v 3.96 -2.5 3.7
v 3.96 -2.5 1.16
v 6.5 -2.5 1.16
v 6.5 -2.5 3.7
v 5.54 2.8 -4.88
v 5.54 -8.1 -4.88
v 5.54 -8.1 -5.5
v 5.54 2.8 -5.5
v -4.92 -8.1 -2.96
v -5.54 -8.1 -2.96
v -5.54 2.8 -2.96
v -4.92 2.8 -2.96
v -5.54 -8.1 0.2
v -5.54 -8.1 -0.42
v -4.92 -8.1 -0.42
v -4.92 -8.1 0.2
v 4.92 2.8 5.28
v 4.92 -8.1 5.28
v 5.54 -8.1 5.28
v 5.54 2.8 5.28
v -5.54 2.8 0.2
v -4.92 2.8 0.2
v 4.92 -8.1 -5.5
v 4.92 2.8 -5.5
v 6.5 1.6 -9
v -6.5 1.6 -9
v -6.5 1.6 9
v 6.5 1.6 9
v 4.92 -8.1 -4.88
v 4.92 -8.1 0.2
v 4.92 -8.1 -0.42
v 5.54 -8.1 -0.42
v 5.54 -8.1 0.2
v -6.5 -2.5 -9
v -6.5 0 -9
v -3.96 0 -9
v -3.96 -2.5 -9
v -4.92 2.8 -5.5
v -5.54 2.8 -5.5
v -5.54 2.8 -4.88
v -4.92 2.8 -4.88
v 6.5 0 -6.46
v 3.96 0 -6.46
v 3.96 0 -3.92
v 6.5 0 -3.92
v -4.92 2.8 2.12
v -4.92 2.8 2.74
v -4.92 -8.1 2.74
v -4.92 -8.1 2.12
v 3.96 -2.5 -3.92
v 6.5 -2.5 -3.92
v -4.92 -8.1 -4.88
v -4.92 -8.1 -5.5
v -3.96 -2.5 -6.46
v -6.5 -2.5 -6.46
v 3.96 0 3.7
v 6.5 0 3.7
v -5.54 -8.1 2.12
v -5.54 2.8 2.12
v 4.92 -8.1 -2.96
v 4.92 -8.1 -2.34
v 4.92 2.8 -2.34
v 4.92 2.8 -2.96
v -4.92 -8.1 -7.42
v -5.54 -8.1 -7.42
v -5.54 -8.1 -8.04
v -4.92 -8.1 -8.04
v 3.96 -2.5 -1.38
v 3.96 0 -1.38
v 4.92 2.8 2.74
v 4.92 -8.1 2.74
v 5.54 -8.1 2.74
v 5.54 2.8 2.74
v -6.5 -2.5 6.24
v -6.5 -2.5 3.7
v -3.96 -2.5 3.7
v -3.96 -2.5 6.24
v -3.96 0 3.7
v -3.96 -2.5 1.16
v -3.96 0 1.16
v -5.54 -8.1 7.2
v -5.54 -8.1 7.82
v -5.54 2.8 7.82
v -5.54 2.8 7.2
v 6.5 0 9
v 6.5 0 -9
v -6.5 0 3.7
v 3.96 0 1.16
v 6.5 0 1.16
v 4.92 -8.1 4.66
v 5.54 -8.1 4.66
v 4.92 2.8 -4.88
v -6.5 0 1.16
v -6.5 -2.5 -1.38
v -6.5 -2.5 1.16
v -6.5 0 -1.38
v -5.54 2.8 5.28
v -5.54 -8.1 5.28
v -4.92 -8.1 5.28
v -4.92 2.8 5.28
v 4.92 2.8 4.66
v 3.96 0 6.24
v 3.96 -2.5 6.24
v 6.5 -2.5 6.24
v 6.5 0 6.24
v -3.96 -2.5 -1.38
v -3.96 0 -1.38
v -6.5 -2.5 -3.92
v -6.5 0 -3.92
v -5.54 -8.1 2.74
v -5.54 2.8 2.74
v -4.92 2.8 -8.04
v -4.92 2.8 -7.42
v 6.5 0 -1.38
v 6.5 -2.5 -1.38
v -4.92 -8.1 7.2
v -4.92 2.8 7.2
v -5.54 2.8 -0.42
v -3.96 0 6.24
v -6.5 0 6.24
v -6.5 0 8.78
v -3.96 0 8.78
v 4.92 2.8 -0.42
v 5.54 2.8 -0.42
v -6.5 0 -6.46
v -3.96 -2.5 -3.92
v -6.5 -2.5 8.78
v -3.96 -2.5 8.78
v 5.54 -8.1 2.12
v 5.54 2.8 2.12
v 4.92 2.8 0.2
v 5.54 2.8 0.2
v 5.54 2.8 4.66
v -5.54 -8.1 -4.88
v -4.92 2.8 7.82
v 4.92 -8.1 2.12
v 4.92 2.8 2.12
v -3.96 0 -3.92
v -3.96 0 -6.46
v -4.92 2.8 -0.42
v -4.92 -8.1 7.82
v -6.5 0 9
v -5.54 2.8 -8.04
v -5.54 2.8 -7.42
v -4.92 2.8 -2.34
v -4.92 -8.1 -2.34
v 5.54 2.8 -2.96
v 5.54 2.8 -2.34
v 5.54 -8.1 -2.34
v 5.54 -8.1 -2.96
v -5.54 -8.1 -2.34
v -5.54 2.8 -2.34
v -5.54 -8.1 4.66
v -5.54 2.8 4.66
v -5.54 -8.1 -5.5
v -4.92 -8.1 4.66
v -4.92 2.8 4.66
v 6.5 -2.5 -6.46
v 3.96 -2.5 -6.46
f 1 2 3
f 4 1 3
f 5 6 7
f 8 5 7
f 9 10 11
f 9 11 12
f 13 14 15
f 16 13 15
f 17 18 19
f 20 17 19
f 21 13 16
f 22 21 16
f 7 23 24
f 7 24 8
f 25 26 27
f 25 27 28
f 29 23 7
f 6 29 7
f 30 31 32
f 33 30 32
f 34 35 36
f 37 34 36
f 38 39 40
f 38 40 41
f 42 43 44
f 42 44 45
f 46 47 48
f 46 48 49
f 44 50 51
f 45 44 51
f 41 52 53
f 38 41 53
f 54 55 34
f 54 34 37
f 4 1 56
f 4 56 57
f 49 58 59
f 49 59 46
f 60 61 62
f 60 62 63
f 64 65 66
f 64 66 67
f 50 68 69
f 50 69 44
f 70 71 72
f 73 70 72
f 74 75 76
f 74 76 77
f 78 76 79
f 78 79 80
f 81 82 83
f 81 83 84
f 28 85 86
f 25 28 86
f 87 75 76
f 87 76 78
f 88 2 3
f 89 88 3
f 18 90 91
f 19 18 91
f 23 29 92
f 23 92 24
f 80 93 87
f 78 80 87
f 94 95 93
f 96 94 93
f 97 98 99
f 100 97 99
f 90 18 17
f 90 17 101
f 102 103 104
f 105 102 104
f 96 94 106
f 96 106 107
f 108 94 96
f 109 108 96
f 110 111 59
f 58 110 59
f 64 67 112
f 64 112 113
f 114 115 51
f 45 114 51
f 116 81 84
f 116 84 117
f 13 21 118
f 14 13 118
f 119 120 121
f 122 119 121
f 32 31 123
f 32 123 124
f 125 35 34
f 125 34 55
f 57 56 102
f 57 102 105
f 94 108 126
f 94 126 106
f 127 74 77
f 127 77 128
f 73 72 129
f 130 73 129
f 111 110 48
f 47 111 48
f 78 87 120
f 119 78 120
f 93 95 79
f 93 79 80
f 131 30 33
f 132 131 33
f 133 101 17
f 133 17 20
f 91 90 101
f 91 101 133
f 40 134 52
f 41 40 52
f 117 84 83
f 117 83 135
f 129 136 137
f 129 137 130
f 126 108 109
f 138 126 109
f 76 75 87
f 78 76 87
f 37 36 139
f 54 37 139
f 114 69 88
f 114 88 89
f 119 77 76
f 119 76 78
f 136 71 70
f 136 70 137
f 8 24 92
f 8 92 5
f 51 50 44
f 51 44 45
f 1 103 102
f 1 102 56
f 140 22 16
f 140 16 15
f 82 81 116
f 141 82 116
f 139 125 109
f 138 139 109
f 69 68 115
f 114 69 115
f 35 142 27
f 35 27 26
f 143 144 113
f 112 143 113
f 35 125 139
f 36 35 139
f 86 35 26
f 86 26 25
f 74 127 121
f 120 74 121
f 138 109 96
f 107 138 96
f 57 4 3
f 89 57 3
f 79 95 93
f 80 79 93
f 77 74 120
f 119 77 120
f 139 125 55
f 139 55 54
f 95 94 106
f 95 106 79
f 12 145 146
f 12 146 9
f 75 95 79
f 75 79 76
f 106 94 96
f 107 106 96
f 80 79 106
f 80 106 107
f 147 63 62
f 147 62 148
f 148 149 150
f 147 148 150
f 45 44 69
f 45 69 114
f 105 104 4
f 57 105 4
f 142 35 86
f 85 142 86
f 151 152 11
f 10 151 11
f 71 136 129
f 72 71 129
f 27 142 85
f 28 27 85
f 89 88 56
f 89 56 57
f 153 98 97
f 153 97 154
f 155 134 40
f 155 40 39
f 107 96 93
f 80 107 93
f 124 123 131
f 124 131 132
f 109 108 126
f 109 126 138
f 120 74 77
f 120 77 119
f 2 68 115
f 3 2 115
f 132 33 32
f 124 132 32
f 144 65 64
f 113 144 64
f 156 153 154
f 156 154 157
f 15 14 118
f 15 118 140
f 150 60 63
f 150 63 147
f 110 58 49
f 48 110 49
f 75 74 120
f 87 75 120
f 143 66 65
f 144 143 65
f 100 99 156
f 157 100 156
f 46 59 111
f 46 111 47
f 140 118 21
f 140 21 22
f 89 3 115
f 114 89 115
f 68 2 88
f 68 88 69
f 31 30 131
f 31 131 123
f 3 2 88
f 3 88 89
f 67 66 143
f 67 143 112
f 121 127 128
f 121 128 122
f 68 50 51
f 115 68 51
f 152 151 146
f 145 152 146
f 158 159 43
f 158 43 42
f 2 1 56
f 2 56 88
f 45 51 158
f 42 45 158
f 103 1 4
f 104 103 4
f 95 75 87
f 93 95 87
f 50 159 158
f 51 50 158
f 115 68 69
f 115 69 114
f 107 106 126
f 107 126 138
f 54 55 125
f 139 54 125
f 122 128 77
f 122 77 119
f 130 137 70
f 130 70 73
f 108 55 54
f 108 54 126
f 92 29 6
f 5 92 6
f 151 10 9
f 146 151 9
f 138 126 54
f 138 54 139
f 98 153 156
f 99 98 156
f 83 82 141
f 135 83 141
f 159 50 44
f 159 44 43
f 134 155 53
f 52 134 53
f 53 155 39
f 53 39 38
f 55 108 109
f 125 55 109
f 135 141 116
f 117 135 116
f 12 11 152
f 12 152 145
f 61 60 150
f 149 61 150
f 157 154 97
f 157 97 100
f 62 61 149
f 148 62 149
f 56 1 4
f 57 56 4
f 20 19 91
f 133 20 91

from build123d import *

# Parameters (mm, degrees)
SKETCH1_W              = 13
SKETCH1_H              = 18
BOSS_EXTRUDE1_DEPTH    = 1.6
SKETCH6_W              = 2.54
SKETCH6_H              = 2.54
BOSS_EXTRUDE2_DEPTH    = 2.5
BOSS_EXTRUDE3_START    = -5.3
SKETCH7_W              = 0.62
SKETCH7_H              = 0.62
BOSS_EXTRUDE3_DEPTH    = 10.9
LPATTERN1_START        = -8.1
LPATTERN1_OUTLINE_W    = 0.62
LPATTERN1_OUTLINE_H    = 0.62
LPATTERN1_DEPTH        = 10.9
LPATTERN1_2_OUTLINE_W  = 0.62
LPATTERN1_2_OUTLINE_H  = 0.62
LPATTERN1_2_DEPTH      = 10.9
LPATTERN1_3_OUTLINE_W  = 0.62
LPATTERN1_3_OUTLINE_H  = 0.62
LPATTERN1_3_DEPTH      = 10.9
LPATTERN1_4_OUTLINE_W  = 0.62
LPATTERN1_4_OUTLINE_H  = 0.62
LPATTERN1_4_DEPTH      = 10.9
LPATTERN1_5_OUTLINE_W  = 0.62
LPATTERN1_5_OUTLINE_H  = 0.62
LPATTERN1_5_DEPTH      = 10.9
LPATTERN1_6_OUTLINE_W  = 0.62
LPATTERN1_6_OUTLINE_H  = 0.62
LPATTERN1_6_DEPTH      = 10.9
LPATTERN1_START_2      = -6.5
LPATTERN1_7_OUTLINE_W  = 2.5
LPATTERN1_7_OUTLINE_H  = 2.54
LPATTERN1_7_DEPTH      = 2.54
LPATTERN1_8_OUTLINE_W  = 2.5
LPATTERN1_8_OUTLINE_H  = 2.54
LPATTERN1_8_DEPTH      = 2.54
LPATTERN1_9_OUTLINE_W  = 2.5
LPATTERN1_9_OUTLINE_H  = 2.54
LPATTERN1_9_DEPTH      = 2.54
LPATTERN1_10_OUTLINE_W = 2.5
LPATTERN1_10_OUTLINE_H = 2.54
LPATTERN1_10_DEPTH     = 2.54
LPATTERN1_11_OUTLINE_W = 2.5
LPATTERN1_11_OUTLINE_H = 2.54
LPATTERN1_11_DEPTH     = 2.54
LPATTERN1_12_OUTLINE_W = 2.5
LPATTERN1_12_OUTLINE_H = 2.54
LPATTERN1_12_DEPTH     = 2.54
LPATTERN2_START        = -2.5
LPATTERN2_OUTLINE_W    = 2.54
LPATTERN2_OUTLINE_H    = 2.54
LPATTERN2_DEPTH        = 2.5
LPATTERN2_START_2      = -8.1
LPATTERN2_2_OUTLINE_W  = 0.62
LPATTERN2_2_OUTLINE_H  = 0.62
LPATTERN2_2_DEPTH      = 10.9
LPATTERN3_COUNT        = 5
LPATTERN3_PITCH        = 2.54


# Read off the part's stored shape, not the designer's step: LPattern1, LPattern2
with BuildPart() as part:
    # Sketch1 → Boss-Extrude1 (new body)
    with BuildSketch(Plane(origin=(0, 0, 0), x_dir=(1, 0, 0), z_dir=(0, 1, 0))):
        Rectangle(SKETCH1_W, SKETCH1_H)
    extrude(amount=BOSS_EXTRUDE1_DEPTH)


with BuildPart() as body_2:
    # Sketch6 → Boss-Extrude2 (new body)
    with BuildSketch(Plane.XZ):
        with Locations((-5.23, -7.73)):
            Rectangle(SKETCH6_W, SKETCH6_H)
    extrude(amount=BOSS_EXTRUDE2_DEPTH)


with BuildPart() as body_3:
    # Sketch7 → Boss-Extrude3 (new body)
    with BuildSketch(Plane.XZ.offset(2.5).offset(BOSS_EXTRUDE3_START)):
        with Locations((-5.23, -7.73)):
            Rectangle(SKETCH7_W, SKETCH7_H)
    extrude(amount=BOSS_EXTRUDE3_DEPTH)


with BuildPart() as body_4:
    # LPattern1 outline → LPattern1 (new body)
    with BuildSketch(Plane(origin=(0, 0, 0), x_dir=(1, 0, 0), z_dir=(0, 1, 0)).offset(LPATTERN1_START)):
        with Locations((-5.23, -7.51)):
            Rectangle(LPATTERN1_OUTLINE_W, LPATTERN1_OUTLINE_H)
    extrude(amount=LPATTERN1_DEPTH)


with BuildPart() as body_5:
    # LPattern1 2 outline → LPattern1 2 (new body)
    with BuildSketch(Plane(origin=(0, 0, 0), x_dir=(1, 0, 0), z_dir=(0, 1, 0)).offset(LPATTERN1_START)):
        with Locations((-5.23, -4.97)):
            Rectangle(LPATTERN1_2_OUTLINE_W, LPATTERN1_2_OUTLINE_H)
    extrude(amount=LPATTERN1_2_DEPTH)


with BuildPart() as body_6:
    # LPattern1 3 outline → LPattern1 3 (new body)
    with BuildSketch(Plane(origin=(0, 0, 0), x_dir=(1, 0, 0), z_dir=(0, 1, 0)).offset(LPATTERN1_START)):
        with Locations((-5.23, -2.43)):
            Rectangle(LPATTERN1_3_OUTLINE_W, LPATTERN1_3_OUTLINE_H)
    extrude(amount=LPATTERN1_3_DEPTH)


with BuildPart() as body_7:
    # LPattern1 4 outline → LPattern1 4 (new body)
    with BuildSketch(Plane(origin=(0, 0, 0), x_dir=(1, 0, 0), z_dir=(0, 1, 0)).offset(LPATTERN1_START)):
        with Locations((-5.23, 0.11)):
            Rectangle(LPATTERN1_4_OUTLINE_W, LPATTERN1_4_OUTLINE_H)
    extrude(amount=LPATTERN1_4_DEPTH)


with BuildPart() as body_8:
    # LPattern1 5 outline → LPattern1 5 (new body)
    with BuildSketch(Plane(origin=(0, 0, 0), x_dir=(1, 0, 0), z_dir=(0, 1, 0)).offset(LPATTERN1_START)):
        with Locations((-5.23, 2.65)):
            Rectangle(LPATTERN1_5_OUTLINE_W, LPATTERN1_5_OUTLINE_H)
    extrude(amount=LPATTERN1_5_DEPTH)


with BuildPart() as body_9:
    # LPattern1 6 outline → LPattern1 6 (new body)
    with BuildSketch(Plane(origin=(0, 0, 0), x_dir=(1, 0, 0), z_dir=(0, 1, 0)).offset(LPATTERN1_START)):
        with Locations((-5.23, 5.19)):
            Rectangle(LPATTERN1_6_OUTLINE_W, LPATTERN1_6_OUTLINE_H)
    extrude(amount=LPATTERN1_6_DEPTH)


with BuildPart() as body_10:
    # LPattern1 7 outline → LPattern1 7 (new body)
    with BuildSketch(Plane.YZ.offset(LPATTERN1_START_2)):
        with Locations((-1.25, 7.51)):
            Rectangle(LPATTERN1_7_OUTLINE_W, LPATTERN1_7_OUTLINE_H)
    extrude(amount=LPATTERN1_7_DEPTH)


with BuildPart() as body_11:
    # LPattern1 8 outline → LPattern1 8 (new body)
    with BuildSketch(Plane.YZ.offset(LPATTERN1_START_2)):
        with Locations((-1.25, 4.97)):
            Rectangle(LPATTERN1_8_OUTLINE_W, LPATTERN1_8_OUTLINE_H)
    extrude(amount=LPATTERN1_8_DEPTH)


with BuildPart() as body_12:
    # LPattern1 9 outline → LPattern1 9 (new body)
    with BuildSketch(Plane.YZ.offset(LPATTERN1_START_2)):
        with Locations((-1.25, 2.43)):
            Rectangle(LPATTERN1_9_OUTLINE_W, LPATTERN1_9_OUTLINE_H)
    extrude(amount=LPATTERN1_9_DEPTH)


with BuildPart() as body_13:
    # LPattern1 10 outline → LPattern1 10 (new body)
    with BuildSketch(Plane.YZ.offset(LPATTERN1_START_2)):
        with Locations((-1.25, -0.11)):
            Rectangle(LPATTERN1_10_OUTLINE_W, LPATTERN1_10_OUTLINE_H)
    extrude(amount=LPATTERN1_10_DEPTH)


with BuildPart() as body_14:
    # LPattern1 11 outline → LPattern1 11 (new body)
    with BuildSketch(Plane.YZ.offset(LPATTERN1_START_2)):
        with Locations((-1.25, -2.65)):
            Rectangle(LPATTERN1_11_OUTLINE_W, LPATTERN1_11_OUTLINE_H)
    extrude(amount=LPATTERN1_11_DEPTH)


with BuildPart() as body_15:
    # LPattern1 12 outline → LPattern1 12 (new body)
    with BuildSketch(Plane.YZ.offset(LPATTERN1_START_2)):
        with Locations((-1.25, -5.19)):
            Rectangle(LPATTERN1_12_OUTLINE_W, LPATTERN1_12_OUTLINE_H)
    extrude(amount=LPATTERN1_12_DEPTH)


with BuildPart() as body_16:
    # LPattern2 outline → LPattern2 (new body)
    with BuildSketch(Plane(origin=(0, 0, 0), x_dir=(1, 0, 0), z_dir=(0, 1, 0)).offset(LPATTERN2_START)):
        with Locations((5.23, 5.19)):
            Rectangle(LPATTERN2_OUTLINE_W, LPATTERN2_OUTLINE_H)
    extrude(amount=LPATTERN2_DEPTH)


with BuildPart() as body_17:
    # LPattern2 2 outline → LPattern2 2 (new body)
    with BuildSketch(Plane(origin=(0, 0, 0), x_dir=(1, 0, 0), z_dir=(0, 1, 0)).offset(LPATTERN2_START_2)):
        with Locations((5.23, 5.19)):
            Rectangle(LPATTERN2_2_OUTLINE_W, LPATTERN2_2_OUTLINE_H)
    extrude(amount=LPATTERN2_2_DEPTH)


with BuildPart() as lpattern3_1:
    # LPattern3: pattern copy
    add(body_17.part.moved(Location(Vector(0, 0, 1) * (1 * LPATTERN3_PITCH))))


with BuildPart() as lpattern3_2:
    # LPattern3: pattern copy
    add(body_17.part.moved(Location(Vector(0, 0, 1) * (2 * LPATTERN3_PITCH))))


with BuildPart() as lpattern3_3:
    # LPattern3: pattern copy
    add(body_17.part.moved(Location(Vector(0, 0, 1) * (3 * LPATTERN3_PITCH))))


with BuildPart() as lpattern3_4:
    # LPattern3: pattern copy
    add(body_17.part.moved(Location(Vector(0, 0, 1) * (4 * LPATTERN3_PITCH))))


with BuildPart() as lpattern3_5:
    # LPattern3: pattern copy
    add(body_16.part.moved(Location(Vector(0, 0, 1) * (1 * LPATTERN3_PITCH))))


with BuildPart() as lpattern3_6:
    # LPattern3: pattern copy
    add(body_16.part.moved(Location(Vector(0, 0, 1) * (2 * LPATTERN3_PITCH))))


with BuildPart() as lpattern3_7:
    # LPattern3: pattern copy
    add(body_16.part.moved(Location(Vector(0, 0, 1) * (3 * LPATTERN3_PITCH))))


with BuildPart() as lpattern3_8:
    # LPattern3: pattern copy
    add(body_16.part.moved(Location(Vector(0, 0, 1) * (4 * LPATTERN3_PITCH))))


solid = Compound([part.part, body_2.part, body_3.part, body_4.part, body_5.part, body_6.part, body_7.part, body_8.part, body_9.part, body_10.part, body_11.part, body_12.part, body_13.part, body_14.part, body_15.part, body_16.part, body_17.part, lpattern3_1.part, lpattern3_2.part, lpattern3_3.part, lpattern3_4.part, lpattern3_5.part, lpattern3_6.part, lpattern3_7.part, lpattern3_8.part])
